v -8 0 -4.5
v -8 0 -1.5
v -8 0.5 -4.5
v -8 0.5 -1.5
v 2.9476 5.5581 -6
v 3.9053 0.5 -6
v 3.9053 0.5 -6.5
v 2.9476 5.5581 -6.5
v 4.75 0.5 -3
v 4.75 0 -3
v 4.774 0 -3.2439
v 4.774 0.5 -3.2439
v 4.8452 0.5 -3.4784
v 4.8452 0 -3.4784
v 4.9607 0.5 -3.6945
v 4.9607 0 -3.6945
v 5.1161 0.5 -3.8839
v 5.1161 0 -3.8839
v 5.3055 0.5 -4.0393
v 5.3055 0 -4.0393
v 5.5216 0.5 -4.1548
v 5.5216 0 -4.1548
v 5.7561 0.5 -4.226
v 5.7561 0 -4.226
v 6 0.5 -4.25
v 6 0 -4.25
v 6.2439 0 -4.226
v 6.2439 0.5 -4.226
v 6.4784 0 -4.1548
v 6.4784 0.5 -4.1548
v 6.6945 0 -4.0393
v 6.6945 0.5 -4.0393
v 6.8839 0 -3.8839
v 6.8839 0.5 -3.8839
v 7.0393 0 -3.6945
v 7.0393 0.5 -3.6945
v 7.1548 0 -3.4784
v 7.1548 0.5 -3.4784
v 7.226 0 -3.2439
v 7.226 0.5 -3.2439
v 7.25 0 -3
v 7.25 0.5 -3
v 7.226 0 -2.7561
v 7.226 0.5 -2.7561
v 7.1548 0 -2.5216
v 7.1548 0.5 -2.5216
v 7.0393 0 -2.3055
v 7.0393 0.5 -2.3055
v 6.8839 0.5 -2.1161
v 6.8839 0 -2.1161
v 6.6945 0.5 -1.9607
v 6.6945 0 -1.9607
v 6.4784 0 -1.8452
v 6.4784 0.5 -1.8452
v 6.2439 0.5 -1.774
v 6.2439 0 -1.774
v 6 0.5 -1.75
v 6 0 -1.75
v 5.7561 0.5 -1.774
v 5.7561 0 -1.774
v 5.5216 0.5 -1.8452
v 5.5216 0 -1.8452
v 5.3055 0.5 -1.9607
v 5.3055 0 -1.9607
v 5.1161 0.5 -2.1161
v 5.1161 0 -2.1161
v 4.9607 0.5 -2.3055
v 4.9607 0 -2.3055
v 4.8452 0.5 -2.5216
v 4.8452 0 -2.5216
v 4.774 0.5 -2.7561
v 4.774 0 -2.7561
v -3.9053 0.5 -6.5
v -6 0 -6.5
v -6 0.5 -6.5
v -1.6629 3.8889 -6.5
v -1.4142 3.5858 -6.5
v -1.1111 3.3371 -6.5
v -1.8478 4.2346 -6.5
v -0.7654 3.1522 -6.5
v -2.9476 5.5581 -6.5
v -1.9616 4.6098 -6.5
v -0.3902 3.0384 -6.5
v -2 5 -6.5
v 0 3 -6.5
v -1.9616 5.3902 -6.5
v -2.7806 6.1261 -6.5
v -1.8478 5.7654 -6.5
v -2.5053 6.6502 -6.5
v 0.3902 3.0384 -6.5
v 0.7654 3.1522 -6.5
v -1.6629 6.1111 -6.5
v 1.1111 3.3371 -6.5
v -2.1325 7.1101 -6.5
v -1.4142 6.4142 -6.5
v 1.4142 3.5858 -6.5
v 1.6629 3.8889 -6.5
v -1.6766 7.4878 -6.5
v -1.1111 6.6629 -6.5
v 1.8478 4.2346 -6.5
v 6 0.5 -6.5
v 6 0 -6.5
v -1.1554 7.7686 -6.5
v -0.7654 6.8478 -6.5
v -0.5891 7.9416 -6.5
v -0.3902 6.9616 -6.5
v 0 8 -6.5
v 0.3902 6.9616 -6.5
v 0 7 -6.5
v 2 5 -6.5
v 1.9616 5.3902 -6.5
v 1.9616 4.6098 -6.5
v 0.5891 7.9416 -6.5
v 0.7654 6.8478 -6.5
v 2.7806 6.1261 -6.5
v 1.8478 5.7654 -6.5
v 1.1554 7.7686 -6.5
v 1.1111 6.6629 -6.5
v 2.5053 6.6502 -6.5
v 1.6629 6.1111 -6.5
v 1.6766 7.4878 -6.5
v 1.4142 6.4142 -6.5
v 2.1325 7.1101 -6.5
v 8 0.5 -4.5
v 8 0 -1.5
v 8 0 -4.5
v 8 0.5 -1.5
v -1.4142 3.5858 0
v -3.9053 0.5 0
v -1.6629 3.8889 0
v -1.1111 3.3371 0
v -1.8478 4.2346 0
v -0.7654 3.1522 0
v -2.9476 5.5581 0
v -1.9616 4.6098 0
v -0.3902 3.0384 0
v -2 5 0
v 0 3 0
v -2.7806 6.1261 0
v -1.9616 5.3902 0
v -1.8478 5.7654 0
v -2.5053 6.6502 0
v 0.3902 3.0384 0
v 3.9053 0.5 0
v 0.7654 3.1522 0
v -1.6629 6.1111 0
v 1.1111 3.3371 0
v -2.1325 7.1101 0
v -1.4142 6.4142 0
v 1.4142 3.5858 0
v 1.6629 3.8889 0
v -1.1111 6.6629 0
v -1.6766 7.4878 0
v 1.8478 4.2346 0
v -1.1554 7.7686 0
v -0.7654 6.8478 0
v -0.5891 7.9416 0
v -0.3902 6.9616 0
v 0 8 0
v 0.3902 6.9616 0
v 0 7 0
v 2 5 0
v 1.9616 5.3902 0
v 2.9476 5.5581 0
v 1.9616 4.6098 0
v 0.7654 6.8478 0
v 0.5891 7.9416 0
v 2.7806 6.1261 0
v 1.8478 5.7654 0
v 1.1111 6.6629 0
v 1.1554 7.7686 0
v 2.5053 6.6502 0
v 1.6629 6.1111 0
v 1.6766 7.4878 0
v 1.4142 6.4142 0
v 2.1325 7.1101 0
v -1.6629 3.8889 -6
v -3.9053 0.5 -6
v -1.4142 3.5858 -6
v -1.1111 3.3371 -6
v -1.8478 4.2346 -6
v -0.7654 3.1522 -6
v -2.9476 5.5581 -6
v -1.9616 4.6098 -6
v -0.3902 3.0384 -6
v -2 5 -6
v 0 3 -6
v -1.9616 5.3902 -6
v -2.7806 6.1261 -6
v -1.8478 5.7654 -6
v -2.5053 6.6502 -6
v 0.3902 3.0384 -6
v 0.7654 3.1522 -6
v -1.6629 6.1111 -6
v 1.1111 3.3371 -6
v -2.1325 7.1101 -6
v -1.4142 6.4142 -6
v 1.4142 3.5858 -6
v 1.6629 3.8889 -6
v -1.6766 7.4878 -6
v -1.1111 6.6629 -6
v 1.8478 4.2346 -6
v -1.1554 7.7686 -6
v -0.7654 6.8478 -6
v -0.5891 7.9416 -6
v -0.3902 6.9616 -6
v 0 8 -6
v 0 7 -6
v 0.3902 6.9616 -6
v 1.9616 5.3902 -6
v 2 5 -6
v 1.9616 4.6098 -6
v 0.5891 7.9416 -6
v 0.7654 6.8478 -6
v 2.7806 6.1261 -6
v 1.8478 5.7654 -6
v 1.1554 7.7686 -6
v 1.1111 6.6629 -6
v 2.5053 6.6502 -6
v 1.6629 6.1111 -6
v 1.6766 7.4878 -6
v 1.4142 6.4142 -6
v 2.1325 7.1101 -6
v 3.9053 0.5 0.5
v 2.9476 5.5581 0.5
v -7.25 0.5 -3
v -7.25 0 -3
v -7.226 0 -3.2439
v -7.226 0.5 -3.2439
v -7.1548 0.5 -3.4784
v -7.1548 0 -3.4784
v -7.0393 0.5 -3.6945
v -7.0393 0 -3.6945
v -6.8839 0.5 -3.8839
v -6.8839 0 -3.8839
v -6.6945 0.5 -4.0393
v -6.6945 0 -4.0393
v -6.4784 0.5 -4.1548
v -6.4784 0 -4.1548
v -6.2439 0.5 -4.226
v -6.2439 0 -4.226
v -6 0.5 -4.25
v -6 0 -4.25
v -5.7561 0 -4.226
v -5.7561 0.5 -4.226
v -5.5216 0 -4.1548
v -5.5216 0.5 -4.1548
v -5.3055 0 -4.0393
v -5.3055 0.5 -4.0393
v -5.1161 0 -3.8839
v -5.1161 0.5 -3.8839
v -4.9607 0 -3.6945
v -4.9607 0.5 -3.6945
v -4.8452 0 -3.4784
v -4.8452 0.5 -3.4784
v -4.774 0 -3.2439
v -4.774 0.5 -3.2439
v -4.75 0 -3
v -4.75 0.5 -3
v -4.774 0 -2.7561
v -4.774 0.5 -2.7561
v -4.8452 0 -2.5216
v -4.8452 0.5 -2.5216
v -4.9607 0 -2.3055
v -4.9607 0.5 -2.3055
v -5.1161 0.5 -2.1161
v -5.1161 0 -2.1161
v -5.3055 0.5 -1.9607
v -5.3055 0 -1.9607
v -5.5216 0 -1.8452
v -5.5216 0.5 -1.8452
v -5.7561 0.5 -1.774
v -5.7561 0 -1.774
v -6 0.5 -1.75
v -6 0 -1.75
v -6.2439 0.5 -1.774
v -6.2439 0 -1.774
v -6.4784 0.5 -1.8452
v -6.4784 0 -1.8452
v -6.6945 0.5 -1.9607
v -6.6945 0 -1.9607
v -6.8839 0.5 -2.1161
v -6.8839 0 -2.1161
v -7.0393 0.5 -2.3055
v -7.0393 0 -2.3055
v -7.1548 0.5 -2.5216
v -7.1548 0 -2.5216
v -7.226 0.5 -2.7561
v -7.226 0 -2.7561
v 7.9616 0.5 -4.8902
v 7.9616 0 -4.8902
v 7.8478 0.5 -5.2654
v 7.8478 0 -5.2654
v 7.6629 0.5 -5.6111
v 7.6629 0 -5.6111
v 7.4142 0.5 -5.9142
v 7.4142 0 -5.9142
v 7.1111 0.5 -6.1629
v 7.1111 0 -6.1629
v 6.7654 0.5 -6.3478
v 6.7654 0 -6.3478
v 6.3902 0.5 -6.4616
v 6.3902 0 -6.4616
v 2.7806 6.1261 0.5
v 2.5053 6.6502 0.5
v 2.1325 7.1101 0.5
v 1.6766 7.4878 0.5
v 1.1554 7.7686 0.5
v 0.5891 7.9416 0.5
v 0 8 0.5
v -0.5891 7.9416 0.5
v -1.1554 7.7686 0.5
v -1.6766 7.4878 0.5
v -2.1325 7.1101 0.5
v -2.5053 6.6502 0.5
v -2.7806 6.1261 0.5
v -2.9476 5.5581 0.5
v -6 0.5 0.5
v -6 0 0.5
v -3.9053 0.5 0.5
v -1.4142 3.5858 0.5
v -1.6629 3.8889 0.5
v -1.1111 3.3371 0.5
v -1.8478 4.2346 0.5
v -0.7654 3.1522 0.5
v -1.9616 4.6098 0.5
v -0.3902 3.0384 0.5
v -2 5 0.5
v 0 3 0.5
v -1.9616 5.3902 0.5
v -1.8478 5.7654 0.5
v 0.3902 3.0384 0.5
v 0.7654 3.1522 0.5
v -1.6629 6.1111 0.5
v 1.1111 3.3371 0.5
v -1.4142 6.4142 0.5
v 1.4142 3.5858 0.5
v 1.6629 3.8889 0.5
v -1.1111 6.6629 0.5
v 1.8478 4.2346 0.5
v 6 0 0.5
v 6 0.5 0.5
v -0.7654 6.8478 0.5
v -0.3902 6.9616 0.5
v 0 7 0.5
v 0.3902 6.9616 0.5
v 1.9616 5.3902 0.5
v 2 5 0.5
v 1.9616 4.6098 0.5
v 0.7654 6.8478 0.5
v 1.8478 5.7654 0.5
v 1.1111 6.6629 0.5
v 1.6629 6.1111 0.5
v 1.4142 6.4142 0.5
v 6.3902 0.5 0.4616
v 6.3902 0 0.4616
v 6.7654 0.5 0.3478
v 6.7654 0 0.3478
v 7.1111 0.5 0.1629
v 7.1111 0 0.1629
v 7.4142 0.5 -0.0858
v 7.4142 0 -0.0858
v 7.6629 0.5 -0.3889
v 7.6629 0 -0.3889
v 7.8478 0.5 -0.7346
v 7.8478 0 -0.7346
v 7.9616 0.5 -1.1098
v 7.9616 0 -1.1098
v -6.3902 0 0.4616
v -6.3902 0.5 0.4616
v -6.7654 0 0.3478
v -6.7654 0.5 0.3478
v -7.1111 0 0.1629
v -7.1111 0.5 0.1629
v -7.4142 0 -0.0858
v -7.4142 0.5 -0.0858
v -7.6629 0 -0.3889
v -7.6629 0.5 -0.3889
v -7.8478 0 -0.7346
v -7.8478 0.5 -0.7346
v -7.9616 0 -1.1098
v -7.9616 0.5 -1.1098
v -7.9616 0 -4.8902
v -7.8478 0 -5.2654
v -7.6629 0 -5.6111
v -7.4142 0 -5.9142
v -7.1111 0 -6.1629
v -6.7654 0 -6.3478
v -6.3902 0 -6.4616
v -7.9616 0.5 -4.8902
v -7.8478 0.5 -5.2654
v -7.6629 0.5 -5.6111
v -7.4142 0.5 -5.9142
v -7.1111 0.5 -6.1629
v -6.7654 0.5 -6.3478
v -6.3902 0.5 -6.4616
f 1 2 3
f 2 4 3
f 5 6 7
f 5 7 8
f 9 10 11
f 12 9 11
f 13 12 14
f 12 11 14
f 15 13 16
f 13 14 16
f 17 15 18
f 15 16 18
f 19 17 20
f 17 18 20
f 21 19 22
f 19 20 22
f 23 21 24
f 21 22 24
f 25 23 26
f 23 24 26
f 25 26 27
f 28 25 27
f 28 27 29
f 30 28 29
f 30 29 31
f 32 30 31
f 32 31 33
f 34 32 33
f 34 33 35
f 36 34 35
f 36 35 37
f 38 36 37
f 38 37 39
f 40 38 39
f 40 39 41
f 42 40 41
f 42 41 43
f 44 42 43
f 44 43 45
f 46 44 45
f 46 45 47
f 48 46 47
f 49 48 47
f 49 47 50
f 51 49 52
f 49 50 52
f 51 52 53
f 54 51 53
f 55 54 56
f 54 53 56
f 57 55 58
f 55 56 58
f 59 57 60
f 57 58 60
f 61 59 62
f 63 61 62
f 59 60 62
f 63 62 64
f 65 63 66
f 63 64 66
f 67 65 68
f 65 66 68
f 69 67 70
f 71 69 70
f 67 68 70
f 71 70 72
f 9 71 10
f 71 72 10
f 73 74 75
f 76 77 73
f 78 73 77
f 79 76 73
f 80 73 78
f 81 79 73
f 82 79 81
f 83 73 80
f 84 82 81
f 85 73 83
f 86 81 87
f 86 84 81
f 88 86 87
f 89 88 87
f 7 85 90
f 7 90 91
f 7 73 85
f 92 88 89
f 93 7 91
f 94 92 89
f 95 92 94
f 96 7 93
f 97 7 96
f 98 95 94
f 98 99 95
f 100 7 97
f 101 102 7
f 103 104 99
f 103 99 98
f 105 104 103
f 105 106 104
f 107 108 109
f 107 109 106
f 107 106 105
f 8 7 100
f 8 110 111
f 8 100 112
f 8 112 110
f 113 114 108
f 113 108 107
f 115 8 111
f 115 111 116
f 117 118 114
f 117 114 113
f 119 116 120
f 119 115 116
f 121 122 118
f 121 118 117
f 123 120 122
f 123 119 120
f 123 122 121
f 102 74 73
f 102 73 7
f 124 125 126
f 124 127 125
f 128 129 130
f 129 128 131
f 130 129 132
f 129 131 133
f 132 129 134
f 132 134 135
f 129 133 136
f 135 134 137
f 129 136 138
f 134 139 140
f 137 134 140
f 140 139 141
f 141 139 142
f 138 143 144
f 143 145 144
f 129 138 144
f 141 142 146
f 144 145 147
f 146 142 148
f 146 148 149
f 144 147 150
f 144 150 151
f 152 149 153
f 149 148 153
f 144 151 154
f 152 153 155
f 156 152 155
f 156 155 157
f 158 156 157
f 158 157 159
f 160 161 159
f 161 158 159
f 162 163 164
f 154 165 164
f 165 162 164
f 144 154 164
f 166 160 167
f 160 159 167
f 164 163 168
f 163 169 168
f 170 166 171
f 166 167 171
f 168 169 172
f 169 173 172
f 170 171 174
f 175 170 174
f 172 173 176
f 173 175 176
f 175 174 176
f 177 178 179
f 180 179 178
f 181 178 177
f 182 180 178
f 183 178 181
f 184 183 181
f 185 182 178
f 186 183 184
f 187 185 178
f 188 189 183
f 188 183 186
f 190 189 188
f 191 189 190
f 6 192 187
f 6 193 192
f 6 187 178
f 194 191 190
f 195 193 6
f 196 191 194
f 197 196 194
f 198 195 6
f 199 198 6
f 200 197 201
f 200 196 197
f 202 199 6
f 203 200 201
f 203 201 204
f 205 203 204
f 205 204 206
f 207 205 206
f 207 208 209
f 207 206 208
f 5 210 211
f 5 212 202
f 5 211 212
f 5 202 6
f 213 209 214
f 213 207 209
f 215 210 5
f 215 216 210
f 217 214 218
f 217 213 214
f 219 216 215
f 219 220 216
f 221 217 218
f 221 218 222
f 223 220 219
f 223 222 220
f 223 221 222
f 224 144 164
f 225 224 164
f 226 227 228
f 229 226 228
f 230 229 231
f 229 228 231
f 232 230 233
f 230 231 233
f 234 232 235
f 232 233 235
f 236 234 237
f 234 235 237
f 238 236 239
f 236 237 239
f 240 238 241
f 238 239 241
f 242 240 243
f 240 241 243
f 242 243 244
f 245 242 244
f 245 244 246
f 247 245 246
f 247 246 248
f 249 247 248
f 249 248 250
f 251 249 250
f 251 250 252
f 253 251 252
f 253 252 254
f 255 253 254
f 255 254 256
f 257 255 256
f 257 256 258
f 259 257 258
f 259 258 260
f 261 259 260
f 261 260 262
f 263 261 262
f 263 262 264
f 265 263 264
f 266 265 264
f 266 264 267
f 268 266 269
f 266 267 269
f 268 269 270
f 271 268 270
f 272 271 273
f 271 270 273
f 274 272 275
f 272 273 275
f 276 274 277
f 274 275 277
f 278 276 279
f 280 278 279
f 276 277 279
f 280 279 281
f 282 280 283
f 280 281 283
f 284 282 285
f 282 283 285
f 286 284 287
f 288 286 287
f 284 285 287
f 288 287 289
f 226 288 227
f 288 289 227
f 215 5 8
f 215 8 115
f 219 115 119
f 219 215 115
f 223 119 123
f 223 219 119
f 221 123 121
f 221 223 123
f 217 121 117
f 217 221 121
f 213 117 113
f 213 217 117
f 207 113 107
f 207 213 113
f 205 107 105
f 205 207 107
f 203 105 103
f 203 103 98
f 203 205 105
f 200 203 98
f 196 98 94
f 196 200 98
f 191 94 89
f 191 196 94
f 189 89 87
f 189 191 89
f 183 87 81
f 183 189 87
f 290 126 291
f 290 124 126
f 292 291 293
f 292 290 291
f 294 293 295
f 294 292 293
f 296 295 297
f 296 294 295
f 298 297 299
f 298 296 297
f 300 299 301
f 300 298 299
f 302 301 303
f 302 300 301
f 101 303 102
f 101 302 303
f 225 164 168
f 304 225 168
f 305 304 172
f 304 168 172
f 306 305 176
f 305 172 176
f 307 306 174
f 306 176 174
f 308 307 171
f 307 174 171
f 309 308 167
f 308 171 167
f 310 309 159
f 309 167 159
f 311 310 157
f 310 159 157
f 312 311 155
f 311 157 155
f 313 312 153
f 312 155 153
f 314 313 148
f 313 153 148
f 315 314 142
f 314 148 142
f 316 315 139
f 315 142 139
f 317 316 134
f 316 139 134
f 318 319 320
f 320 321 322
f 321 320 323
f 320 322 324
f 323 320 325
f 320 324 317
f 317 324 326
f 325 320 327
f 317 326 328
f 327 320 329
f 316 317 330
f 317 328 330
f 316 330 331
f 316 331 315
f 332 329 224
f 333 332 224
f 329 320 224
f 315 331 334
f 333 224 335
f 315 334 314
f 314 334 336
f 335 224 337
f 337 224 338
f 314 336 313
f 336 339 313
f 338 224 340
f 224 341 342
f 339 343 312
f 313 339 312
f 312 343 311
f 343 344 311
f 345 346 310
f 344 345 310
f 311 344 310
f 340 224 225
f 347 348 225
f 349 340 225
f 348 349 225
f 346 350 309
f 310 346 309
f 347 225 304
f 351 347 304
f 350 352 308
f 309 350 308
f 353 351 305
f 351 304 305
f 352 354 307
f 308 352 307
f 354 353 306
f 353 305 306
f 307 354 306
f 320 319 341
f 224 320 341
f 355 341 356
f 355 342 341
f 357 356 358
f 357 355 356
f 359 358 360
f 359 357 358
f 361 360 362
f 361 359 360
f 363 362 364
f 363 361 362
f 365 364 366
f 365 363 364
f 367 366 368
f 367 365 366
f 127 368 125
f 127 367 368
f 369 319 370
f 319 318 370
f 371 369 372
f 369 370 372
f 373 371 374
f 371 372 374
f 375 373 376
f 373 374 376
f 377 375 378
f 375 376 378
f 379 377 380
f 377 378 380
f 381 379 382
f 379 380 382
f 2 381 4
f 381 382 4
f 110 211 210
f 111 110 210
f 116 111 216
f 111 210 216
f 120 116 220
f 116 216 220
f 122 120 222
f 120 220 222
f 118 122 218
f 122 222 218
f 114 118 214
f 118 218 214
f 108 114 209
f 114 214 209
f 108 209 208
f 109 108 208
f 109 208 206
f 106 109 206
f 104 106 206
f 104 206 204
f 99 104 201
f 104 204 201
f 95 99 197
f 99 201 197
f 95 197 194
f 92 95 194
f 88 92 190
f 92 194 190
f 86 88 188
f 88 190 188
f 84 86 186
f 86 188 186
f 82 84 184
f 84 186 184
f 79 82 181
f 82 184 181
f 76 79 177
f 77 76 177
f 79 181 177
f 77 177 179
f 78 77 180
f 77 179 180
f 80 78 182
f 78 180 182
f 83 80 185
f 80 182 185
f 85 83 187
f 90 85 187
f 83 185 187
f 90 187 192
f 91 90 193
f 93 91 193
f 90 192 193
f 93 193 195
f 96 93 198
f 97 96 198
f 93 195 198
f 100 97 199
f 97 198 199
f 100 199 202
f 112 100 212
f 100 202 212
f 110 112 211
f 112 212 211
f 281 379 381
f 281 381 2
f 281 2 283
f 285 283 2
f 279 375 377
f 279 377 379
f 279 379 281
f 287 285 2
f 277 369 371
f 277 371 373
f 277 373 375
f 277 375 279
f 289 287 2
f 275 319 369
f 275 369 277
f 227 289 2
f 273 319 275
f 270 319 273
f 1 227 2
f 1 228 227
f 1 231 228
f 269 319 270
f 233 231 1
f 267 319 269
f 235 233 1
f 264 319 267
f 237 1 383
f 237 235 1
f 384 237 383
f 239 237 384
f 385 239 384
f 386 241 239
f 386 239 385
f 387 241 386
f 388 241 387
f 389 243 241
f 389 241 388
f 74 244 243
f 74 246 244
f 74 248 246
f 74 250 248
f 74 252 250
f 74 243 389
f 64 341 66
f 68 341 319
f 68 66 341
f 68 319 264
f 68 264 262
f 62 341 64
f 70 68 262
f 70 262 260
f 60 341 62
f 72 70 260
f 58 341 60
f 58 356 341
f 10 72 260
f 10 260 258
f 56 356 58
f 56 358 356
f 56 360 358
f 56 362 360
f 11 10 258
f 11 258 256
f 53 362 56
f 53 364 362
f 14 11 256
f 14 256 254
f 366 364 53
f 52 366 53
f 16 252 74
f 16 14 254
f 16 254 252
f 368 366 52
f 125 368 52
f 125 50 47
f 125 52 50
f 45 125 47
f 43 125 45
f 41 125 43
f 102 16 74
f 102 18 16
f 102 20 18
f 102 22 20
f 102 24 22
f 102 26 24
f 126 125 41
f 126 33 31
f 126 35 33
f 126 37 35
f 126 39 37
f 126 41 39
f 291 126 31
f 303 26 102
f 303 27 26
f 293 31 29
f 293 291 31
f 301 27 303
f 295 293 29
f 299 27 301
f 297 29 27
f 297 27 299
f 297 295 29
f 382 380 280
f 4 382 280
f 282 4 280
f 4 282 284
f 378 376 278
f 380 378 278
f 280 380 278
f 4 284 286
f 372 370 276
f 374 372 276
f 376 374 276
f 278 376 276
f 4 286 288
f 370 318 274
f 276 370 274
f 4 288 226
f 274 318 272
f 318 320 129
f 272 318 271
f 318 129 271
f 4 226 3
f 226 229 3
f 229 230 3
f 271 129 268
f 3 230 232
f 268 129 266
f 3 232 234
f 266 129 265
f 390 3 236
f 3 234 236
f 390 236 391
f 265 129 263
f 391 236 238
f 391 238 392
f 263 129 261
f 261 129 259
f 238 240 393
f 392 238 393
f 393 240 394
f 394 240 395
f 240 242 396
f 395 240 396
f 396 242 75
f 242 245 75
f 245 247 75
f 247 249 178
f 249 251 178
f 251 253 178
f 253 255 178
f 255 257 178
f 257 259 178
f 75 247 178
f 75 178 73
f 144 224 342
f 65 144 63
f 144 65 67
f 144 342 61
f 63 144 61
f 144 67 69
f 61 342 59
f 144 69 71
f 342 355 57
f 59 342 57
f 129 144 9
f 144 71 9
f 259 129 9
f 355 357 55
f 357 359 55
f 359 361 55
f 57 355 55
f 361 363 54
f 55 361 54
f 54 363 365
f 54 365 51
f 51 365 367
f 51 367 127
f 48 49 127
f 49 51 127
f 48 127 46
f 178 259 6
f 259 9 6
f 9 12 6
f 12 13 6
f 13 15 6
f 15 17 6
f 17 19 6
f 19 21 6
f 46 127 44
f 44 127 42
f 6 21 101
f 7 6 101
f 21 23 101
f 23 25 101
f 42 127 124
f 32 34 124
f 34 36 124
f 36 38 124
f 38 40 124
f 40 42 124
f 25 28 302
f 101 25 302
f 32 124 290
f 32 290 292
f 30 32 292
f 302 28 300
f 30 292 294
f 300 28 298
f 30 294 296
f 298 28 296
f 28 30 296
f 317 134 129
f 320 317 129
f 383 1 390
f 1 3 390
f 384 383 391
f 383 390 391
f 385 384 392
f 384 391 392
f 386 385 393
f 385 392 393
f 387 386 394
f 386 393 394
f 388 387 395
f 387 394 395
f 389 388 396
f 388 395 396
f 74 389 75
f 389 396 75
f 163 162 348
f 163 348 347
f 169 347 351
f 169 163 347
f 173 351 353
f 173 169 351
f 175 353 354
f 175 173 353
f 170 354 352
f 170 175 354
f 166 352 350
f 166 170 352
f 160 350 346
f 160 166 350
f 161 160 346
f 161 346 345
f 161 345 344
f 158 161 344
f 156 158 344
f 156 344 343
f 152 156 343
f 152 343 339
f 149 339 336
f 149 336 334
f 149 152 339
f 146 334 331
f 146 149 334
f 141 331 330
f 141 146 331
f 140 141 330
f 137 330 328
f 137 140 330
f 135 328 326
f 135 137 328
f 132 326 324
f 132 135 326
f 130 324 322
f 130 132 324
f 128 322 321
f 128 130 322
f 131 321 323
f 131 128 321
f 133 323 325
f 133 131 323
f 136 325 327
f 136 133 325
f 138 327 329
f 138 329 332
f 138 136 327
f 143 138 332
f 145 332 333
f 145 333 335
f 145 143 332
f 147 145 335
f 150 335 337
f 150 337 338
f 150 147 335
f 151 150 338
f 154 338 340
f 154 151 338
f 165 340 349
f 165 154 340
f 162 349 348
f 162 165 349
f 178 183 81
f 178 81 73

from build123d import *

# Parameters (mm, degrees)
SKETCH_1_R      = 2
EXTRUDE_1_DEPTH = 0.5
EXTRUDE_2_DEPTH = 3
SKETCH_4_W      = 7
SKETCH_4_H      = 0.5
EXTRUDE_3_DEPTH = 8
F_2_5MM_1_D     = 2.5
FILLET_1_R      = 2


with BuildPart() as part:
    # 草圖1 → 填料-伸長1 (new body)
    with BuildSketch(Plane.XY):
        with BuildLine():
            Line((-4, 0), (4, 0))
            Line((4, 0), (2.947629603, 5.558103683))
            ThreePointArc((2.947629603, 5.558103683), (0, 8), (-2.947629603, 5.558103683))
            Line((-2.947629603, 5.558103683), (-4, 0))
        make_face()
        with Locations((0, 5)):
            Circle(SKETCH_1_R, mode=Mode.SUBTRACT)
    extrude(amount=EXTRUDE_1_DEPTH)

    # 草圖1<3> → 填料-伸長2 (add)
    with BuildSketch(Plane.XY):
        Polygon((-3.905330086, 0.5), (-4, 0), (4, 0), (3.905330086, 0.5), align=None)
    extrude(amount=-EXTRUDE_2_DEPTH)

    # 鏡射1: part across plane


with BuildPart() as part_1:
    add(part.part)
    add(part.part.mirror(Plane.XY.offset(-3)))

    # 草圖4 → 填料-伸長3 (add, symmetric)
    with BuildSketch(Plane(origin=(0, 0, 0), x_dir=(0, 0, -1), z_dir=(1, 0, 0))):
        with Locations((3, 0.25)):
            Rectangle(SKETCH_4_W, SKETCH_4_H)
    extrude(amount=EXTRUDE_3_DEPTH, both=True)

    # Ø2.5mm 定位孔1 (through all)
    with Locations(Plane(origin=(0, 0.5, 0), x_dir=(1, 0, 0), z_dir=(0, 1, 0))):
        with Locations((-6, 3), (6, 3)):
            Hole(F_2_5MM_1_D / 2)

    # 圓角1
    fillet_1_edges = [part_1.edges().sort_by_distance(p)[0] for p in [
        (-8, 0.25, 0.5),
        (-8, 0.25, -6.5),
        (8, 0.25, 0.5),
        (8, 0.25, -6.5),
    ]]
    fillet(fillet_1_edges, radius=FILLET_1_R)


solid = part_1.part
